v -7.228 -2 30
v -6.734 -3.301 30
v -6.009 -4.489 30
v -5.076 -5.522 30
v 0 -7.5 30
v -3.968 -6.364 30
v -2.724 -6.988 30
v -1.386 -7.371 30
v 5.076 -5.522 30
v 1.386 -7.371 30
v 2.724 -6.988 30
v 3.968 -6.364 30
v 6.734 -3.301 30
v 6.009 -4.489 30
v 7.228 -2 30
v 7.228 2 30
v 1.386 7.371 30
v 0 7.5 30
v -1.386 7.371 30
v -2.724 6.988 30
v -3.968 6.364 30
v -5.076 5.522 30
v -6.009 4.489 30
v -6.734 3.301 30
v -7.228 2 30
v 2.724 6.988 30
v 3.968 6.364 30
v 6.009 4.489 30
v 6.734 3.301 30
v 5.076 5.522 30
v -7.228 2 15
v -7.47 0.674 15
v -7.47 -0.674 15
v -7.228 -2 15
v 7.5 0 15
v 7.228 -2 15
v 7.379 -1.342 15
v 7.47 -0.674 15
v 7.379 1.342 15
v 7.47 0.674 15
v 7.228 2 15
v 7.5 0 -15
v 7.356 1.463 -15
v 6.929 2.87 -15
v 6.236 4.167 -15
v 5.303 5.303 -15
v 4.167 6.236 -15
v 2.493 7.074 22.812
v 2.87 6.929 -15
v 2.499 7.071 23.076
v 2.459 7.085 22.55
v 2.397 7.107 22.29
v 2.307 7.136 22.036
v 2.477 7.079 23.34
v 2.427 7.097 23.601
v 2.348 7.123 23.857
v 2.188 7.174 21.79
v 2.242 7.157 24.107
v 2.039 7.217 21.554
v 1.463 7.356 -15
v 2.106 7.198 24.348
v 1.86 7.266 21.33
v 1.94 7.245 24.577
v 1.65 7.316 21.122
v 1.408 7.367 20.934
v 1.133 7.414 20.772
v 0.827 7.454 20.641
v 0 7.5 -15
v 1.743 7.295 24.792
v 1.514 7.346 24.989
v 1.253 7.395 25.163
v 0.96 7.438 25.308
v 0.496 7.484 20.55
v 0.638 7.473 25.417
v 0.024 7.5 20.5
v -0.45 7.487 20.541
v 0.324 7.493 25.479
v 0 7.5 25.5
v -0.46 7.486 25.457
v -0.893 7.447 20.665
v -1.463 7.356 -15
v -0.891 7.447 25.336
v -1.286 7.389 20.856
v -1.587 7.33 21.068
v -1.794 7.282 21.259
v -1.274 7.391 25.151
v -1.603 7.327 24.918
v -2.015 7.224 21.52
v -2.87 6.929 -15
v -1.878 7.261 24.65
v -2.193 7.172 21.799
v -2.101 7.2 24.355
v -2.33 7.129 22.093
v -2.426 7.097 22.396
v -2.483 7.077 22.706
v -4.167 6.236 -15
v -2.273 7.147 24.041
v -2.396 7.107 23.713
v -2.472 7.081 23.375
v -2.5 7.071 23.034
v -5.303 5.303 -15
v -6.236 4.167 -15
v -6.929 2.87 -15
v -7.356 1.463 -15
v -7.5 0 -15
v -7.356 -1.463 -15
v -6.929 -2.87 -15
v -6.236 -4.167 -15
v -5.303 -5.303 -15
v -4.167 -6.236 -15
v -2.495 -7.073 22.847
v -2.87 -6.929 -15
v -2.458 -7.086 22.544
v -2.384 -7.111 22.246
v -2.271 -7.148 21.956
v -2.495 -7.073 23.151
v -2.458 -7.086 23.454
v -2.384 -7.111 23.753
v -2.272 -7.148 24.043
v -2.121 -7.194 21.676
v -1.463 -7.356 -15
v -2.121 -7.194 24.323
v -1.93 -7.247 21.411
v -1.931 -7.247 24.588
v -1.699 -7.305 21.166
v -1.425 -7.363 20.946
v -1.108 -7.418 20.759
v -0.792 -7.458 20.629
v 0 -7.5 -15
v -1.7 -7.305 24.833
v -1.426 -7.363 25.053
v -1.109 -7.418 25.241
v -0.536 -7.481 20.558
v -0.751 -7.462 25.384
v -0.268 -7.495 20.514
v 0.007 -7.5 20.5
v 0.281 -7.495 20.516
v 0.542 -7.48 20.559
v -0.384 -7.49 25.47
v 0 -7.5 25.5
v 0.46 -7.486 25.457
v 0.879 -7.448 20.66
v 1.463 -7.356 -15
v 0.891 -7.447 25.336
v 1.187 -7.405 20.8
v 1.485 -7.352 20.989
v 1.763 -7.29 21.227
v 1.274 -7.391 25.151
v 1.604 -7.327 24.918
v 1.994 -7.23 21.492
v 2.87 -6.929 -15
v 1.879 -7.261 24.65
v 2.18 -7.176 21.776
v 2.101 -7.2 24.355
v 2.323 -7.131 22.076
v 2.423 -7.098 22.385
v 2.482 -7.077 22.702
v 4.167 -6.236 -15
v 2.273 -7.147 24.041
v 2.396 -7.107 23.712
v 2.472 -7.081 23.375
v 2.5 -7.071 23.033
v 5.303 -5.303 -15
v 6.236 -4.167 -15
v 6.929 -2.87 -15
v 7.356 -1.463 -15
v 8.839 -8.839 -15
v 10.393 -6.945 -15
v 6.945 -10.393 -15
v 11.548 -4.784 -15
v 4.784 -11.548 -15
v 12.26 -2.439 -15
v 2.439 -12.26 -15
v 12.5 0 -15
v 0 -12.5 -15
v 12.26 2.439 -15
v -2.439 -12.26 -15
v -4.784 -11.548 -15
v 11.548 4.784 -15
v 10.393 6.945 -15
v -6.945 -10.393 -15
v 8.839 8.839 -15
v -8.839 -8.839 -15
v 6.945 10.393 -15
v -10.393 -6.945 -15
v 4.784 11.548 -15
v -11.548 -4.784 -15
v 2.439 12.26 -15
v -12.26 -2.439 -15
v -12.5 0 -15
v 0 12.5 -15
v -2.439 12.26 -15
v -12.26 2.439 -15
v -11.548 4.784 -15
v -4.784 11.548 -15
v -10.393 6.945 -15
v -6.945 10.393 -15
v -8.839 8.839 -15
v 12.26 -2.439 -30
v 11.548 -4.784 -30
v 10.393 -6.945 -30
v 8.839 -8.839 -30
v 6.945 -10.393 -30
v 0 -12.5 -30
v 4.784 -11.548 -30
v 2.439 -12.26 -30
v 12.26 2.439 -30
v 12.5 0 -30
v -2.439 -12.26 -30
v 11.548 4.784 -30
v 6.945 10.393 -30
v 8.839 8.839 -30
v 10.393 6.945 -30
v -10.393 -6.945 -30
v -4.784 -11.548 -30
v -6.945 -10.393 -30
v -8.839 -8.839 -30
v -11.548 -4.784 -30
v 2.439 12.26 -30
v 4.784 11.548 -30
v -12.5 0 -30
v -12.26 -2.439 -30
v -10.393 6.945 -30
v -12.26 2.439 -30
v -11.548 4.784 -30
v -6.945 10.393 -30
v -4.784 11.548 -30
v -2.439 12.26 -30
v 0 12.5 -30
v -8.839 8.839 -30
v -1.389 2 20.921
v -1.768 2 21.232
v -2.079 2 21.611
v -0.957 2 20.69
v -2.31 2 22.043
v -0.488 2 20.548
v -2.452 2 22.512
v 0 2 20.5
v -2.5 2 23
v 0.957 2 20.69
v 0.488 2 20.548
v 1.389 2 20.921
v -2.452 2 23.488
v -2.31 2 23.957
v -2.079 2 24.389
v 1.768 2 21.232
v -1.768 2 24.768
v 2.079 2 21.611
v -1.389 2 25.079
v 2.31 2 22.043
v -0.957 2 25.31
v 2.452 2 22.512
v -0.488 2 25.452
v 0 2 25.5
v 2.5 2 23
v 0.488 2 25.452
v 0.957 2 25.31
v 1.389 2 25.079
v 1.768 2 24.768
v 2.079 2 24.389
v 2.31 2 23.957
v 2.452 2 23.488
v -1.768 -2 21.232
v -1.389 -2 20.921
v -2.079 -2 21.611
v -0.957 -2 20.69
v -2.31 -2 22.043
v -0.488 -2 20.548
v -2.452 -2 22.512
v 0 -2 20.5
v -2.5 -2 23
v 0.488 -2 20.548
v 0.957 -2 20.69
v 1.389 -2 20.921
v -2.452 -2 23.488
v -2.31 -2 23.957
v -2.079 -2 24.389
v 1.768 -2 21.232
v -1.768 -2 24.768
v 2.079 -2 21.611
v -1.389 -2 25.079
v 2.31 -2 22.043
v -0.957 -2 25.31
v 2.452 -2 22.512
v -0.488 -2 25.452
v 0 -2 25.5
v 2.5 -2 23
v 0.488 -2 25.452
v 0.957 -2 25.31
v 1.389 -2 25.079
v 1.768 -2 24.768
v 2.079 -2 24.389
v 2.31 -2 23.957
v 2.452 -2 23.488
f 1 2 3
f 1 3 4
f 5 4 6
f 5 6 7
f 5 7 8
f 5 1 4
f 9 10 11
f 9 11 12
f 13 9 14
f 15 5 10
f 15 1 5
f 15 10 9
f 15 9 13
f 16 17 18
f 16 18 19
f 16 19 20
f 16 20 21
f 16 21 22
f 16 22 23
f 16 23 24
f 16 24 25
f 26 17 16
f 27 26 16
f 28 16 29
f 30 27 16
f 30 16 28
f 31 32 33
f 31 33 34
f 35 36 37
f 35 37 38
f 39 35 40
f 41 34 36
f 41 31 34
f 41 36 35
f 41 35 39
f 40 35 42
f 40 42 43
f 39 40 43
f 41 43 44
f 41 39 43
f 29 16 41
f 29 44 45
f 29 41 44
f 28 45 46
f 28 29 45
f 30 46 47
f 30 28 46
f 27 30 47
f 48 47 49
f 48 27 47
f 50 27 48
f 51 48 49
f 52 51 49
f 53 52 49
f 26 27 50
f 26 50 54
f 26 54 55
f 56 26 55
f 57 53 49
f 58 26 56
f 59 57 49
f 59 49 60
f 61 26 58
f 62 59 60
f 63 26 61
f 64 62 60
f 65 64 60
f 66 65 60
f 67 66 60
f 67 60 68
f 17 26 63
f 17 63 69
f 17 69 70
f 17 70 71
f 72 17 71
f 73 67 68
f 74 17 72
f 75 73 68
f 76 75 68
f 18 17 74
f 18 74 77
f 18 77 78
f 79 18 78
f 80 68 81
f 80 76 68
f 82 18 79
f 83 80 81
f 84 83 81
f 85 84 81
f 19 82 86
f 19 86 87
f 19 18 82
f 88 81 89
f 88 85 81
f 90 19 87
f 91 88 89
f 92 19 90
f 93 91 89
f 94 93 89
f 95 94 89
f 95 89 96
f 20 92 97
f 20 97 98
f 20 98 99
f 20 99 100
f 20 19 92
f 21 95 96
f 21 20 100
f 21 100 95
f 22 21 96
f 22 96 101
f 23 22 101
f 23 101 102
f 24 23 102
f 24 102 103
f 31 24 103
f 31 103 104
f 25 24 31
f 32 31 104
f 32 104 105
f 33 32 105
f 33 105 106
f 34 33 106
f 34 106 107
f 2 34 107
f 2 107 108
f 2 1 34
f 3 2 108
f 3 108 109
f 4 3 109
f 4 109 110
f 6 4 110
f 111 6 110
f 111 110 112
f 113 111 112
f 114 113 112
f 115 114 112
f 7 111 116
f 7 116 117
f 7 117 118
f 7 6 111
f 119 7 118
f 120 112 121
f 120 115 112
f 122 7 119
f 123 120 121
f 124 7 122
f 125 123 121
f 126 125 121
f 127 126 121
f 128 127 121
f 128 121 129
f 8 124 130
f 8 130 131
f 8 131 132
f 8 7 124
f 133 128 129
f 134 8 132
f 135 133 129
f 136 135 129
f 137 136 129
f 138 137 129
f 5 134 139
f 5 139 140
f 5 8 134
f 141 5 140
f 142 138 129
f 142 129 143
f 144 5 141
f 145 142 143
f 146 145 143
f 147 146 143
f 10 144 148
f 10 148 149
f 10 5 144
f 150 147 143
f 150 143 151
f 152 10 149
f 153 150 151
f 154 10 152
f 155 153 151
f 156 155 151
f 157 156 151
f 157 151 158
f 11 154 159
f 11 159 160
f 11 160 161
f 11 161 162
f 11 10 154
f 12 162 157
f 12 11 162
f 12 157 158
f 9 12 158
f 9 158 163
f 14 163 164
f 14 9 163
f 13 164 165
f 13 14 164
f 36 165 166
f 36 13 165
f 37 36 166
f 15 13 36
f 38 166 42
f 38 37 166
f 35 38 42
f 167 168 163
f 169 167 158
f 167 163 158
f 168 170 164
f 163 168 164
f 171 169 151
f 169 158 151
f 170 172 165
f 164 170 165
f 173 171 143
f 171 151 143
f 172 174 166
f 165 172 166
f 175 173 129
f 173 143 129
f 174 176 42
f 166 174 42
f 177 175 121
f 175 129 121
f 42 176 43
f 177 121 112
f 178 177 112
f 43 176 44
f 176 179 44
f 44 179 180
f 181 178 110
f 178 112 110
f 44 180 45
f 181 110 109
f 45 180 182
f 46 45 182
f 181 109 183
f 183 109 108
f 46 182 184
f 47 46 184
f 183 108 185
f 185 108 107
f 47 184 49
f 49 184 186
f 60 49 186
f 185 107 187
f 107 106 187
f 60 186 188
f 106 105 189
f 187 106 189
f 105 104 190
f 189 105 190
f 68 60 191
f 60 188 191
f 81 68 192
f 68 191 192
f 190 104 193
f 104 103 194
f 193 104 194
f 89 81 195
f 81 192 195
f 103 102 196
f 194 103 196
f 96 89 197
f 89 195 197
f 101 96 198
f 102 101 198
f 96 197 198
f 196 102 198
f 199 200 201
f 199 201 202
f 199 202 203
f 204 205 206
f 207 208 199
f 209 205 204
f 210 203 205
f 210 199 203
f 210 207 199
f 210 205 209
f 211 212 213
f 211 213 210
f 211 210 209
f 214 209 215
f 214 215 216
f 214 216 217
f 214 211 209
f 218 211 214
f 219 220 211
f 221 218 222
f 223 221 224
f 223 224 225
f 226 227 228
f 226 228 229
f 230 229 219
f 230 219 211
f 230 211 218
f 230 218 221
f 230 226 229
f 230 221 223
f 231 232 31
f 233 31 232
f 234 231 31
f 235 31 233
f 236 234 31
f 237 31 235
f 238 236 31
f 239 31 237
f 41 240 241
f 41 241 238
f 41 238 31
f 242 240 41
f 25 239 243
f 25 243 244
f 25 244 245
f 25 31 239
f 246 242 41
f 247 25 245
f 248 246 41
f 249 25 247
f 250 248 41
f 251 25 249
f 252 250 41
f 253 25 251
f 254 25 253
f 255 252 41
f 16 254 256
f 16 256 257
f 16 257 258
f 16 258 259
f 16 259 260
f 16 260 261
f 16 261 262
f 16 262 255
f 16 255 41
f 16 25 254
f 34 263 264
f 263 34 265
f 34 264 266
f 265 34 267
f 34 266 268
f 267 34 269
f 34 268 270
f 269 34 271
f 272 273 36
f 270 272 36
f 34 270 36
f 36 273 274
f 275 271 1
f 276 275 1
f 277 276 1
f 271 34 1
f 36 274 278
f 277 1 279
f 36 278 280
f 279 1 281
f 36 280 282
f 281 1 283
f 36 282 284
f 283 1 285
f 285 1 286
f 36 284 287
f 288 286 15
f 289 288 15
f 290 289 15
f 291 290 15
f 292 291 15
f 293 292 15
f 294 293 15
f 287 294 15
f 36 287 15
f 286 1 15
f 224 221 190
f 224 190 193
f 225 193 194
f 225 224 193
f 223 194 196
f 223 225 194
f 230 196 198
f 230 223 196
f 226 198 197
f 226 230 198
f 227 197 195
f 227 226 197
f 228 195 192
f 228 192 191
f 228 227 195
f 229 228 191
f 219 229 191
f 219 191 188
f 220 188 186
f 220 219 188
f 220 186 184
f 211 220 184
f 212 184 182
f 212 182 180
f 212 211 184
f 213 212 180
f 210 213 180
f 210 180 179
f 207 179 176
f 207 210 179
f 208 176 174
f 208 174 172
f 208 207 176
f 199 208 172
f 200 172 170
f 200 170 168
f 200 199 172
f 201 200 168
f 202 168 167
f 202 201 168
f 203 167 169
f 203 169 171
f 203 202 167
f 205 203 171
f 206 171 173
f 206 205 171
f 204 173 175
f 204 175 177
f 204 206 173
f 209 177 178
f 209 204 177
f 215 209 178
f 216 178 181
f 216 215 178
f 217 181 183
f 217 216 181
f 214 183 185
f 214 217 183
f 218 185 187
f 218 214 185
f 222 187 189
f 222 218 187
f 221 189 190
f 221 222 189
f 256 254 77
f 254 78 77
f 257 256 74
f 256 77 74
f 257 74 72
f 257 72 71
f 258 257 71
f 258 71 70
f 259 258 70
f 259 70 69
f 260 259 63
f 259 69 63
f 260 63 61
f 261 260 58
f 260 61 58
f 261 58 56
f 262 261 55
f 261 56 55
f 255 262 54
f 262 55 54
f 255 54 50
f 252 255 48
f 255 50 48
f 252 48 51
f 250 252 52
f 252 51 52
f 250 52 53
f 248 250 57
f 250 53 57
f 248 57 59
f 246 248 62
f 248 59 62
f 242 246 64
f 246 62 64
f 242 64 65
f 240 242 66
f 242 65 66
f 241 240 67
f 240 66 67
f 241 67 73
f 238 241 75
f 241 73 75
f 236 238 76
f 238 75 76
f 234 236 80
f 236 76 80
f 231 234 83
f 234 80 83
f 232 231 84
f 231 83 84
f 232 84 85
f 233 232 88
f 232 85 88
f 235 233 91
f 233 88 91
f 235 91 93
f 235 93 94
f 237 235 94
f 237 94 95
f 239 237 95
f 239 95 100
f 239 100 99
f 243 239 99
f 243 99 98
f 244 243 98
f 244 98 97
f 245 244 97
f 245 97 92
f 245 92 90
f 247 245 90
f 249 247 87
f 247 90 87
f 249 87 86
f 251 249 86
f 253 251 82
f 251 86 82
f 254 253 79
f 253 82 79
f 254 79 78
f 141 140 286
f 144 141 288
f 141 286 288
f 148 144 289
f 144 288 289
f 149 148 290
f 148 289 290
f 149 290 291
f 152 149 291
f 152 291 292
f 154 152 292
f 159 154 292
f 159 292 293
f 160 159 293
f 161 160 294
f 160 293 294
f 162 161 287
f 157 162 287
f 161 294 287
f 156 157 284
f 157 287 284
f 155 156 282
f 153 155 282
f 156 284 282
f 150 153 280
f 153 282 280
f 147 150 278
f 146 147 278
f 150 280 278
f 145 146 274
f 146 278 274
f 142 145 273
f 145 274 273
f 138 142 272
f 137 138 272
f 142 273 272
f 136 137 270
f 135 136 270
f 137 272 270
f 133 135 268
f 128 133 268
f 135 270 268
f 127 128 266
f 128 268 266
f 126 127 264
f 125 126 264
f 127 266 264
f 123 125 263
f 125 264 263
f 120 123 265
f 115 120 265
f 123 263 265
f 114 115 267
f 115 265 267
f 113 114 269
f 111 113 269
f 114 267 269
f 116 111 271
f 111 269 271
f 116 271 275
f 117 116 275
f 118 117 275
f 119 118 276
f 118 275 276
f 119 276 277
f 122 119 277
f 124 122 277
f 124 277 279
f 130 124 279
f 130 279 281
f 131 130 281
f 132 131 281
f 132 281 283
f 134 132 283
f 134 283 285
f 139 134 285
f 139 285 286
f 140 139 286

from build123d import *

# Parameters (mm, degrees)
SKETCH1_R           = 7.5
BOSS_EXTRUDE1_DEPTH = 30
SKETCH2_W           = 20
SKETCH2_H           = 4
CUT_EXTRUDE1_DEPTH  = 15
SKETCH3_R           = 2.5
CUT_EXTRUDE2_DEPTH  = 7.5
SKETCH4_R           = 12.5
BOSS_EXTRUDE2_DEPTH = 15


with BuildPart() as part:
    # Sketch1 → Boss-Extrude1 (new, symmetric)
    with BuildSketch(Plane.XY):
        Circle(SKETCH1_R)
    extrude(amount=BOSS_EXTRUDE1_DEPTH, both=True)

    # Sketch2 → Cut-Extrude1 (cut)
    with BuildSketch(Plane.XY.offset(30)):
        Rectangle(SKETCH2_W, SKETCH2_H)
    extrude(amount=-CUT_EXTRUDE1_DEPTH, mode=Mode.SUBTRACT)

    # Sketch3 → Cut-Extrude2 (cut, symmetric)
    with BuildSketch(Plane(origin=(0, 0, 0), x_dir=(1, 0, 0), z_dir=(0, 1, 0))):
        with Locations(Location((0, -23, 0), (0, 0, 270))):
            Circle(SKETCH3_R)
    extrude(amount=CUT_EXTRUDE2_DEPTH, both=True, mode=Mode.SUBTRACT)

    # Sketch4 → Boss-Extrude2 (add)
    with BuildSketch(Plane(origin=(0, 0, -30), x_dir=(-1, 0, 0), z_dir=(0, 0, -1))):
        Circle(SKETCH4_R)
    extrude(amount=-BOSS_EXTRUDE2_DEPTH)


solid = part.part
